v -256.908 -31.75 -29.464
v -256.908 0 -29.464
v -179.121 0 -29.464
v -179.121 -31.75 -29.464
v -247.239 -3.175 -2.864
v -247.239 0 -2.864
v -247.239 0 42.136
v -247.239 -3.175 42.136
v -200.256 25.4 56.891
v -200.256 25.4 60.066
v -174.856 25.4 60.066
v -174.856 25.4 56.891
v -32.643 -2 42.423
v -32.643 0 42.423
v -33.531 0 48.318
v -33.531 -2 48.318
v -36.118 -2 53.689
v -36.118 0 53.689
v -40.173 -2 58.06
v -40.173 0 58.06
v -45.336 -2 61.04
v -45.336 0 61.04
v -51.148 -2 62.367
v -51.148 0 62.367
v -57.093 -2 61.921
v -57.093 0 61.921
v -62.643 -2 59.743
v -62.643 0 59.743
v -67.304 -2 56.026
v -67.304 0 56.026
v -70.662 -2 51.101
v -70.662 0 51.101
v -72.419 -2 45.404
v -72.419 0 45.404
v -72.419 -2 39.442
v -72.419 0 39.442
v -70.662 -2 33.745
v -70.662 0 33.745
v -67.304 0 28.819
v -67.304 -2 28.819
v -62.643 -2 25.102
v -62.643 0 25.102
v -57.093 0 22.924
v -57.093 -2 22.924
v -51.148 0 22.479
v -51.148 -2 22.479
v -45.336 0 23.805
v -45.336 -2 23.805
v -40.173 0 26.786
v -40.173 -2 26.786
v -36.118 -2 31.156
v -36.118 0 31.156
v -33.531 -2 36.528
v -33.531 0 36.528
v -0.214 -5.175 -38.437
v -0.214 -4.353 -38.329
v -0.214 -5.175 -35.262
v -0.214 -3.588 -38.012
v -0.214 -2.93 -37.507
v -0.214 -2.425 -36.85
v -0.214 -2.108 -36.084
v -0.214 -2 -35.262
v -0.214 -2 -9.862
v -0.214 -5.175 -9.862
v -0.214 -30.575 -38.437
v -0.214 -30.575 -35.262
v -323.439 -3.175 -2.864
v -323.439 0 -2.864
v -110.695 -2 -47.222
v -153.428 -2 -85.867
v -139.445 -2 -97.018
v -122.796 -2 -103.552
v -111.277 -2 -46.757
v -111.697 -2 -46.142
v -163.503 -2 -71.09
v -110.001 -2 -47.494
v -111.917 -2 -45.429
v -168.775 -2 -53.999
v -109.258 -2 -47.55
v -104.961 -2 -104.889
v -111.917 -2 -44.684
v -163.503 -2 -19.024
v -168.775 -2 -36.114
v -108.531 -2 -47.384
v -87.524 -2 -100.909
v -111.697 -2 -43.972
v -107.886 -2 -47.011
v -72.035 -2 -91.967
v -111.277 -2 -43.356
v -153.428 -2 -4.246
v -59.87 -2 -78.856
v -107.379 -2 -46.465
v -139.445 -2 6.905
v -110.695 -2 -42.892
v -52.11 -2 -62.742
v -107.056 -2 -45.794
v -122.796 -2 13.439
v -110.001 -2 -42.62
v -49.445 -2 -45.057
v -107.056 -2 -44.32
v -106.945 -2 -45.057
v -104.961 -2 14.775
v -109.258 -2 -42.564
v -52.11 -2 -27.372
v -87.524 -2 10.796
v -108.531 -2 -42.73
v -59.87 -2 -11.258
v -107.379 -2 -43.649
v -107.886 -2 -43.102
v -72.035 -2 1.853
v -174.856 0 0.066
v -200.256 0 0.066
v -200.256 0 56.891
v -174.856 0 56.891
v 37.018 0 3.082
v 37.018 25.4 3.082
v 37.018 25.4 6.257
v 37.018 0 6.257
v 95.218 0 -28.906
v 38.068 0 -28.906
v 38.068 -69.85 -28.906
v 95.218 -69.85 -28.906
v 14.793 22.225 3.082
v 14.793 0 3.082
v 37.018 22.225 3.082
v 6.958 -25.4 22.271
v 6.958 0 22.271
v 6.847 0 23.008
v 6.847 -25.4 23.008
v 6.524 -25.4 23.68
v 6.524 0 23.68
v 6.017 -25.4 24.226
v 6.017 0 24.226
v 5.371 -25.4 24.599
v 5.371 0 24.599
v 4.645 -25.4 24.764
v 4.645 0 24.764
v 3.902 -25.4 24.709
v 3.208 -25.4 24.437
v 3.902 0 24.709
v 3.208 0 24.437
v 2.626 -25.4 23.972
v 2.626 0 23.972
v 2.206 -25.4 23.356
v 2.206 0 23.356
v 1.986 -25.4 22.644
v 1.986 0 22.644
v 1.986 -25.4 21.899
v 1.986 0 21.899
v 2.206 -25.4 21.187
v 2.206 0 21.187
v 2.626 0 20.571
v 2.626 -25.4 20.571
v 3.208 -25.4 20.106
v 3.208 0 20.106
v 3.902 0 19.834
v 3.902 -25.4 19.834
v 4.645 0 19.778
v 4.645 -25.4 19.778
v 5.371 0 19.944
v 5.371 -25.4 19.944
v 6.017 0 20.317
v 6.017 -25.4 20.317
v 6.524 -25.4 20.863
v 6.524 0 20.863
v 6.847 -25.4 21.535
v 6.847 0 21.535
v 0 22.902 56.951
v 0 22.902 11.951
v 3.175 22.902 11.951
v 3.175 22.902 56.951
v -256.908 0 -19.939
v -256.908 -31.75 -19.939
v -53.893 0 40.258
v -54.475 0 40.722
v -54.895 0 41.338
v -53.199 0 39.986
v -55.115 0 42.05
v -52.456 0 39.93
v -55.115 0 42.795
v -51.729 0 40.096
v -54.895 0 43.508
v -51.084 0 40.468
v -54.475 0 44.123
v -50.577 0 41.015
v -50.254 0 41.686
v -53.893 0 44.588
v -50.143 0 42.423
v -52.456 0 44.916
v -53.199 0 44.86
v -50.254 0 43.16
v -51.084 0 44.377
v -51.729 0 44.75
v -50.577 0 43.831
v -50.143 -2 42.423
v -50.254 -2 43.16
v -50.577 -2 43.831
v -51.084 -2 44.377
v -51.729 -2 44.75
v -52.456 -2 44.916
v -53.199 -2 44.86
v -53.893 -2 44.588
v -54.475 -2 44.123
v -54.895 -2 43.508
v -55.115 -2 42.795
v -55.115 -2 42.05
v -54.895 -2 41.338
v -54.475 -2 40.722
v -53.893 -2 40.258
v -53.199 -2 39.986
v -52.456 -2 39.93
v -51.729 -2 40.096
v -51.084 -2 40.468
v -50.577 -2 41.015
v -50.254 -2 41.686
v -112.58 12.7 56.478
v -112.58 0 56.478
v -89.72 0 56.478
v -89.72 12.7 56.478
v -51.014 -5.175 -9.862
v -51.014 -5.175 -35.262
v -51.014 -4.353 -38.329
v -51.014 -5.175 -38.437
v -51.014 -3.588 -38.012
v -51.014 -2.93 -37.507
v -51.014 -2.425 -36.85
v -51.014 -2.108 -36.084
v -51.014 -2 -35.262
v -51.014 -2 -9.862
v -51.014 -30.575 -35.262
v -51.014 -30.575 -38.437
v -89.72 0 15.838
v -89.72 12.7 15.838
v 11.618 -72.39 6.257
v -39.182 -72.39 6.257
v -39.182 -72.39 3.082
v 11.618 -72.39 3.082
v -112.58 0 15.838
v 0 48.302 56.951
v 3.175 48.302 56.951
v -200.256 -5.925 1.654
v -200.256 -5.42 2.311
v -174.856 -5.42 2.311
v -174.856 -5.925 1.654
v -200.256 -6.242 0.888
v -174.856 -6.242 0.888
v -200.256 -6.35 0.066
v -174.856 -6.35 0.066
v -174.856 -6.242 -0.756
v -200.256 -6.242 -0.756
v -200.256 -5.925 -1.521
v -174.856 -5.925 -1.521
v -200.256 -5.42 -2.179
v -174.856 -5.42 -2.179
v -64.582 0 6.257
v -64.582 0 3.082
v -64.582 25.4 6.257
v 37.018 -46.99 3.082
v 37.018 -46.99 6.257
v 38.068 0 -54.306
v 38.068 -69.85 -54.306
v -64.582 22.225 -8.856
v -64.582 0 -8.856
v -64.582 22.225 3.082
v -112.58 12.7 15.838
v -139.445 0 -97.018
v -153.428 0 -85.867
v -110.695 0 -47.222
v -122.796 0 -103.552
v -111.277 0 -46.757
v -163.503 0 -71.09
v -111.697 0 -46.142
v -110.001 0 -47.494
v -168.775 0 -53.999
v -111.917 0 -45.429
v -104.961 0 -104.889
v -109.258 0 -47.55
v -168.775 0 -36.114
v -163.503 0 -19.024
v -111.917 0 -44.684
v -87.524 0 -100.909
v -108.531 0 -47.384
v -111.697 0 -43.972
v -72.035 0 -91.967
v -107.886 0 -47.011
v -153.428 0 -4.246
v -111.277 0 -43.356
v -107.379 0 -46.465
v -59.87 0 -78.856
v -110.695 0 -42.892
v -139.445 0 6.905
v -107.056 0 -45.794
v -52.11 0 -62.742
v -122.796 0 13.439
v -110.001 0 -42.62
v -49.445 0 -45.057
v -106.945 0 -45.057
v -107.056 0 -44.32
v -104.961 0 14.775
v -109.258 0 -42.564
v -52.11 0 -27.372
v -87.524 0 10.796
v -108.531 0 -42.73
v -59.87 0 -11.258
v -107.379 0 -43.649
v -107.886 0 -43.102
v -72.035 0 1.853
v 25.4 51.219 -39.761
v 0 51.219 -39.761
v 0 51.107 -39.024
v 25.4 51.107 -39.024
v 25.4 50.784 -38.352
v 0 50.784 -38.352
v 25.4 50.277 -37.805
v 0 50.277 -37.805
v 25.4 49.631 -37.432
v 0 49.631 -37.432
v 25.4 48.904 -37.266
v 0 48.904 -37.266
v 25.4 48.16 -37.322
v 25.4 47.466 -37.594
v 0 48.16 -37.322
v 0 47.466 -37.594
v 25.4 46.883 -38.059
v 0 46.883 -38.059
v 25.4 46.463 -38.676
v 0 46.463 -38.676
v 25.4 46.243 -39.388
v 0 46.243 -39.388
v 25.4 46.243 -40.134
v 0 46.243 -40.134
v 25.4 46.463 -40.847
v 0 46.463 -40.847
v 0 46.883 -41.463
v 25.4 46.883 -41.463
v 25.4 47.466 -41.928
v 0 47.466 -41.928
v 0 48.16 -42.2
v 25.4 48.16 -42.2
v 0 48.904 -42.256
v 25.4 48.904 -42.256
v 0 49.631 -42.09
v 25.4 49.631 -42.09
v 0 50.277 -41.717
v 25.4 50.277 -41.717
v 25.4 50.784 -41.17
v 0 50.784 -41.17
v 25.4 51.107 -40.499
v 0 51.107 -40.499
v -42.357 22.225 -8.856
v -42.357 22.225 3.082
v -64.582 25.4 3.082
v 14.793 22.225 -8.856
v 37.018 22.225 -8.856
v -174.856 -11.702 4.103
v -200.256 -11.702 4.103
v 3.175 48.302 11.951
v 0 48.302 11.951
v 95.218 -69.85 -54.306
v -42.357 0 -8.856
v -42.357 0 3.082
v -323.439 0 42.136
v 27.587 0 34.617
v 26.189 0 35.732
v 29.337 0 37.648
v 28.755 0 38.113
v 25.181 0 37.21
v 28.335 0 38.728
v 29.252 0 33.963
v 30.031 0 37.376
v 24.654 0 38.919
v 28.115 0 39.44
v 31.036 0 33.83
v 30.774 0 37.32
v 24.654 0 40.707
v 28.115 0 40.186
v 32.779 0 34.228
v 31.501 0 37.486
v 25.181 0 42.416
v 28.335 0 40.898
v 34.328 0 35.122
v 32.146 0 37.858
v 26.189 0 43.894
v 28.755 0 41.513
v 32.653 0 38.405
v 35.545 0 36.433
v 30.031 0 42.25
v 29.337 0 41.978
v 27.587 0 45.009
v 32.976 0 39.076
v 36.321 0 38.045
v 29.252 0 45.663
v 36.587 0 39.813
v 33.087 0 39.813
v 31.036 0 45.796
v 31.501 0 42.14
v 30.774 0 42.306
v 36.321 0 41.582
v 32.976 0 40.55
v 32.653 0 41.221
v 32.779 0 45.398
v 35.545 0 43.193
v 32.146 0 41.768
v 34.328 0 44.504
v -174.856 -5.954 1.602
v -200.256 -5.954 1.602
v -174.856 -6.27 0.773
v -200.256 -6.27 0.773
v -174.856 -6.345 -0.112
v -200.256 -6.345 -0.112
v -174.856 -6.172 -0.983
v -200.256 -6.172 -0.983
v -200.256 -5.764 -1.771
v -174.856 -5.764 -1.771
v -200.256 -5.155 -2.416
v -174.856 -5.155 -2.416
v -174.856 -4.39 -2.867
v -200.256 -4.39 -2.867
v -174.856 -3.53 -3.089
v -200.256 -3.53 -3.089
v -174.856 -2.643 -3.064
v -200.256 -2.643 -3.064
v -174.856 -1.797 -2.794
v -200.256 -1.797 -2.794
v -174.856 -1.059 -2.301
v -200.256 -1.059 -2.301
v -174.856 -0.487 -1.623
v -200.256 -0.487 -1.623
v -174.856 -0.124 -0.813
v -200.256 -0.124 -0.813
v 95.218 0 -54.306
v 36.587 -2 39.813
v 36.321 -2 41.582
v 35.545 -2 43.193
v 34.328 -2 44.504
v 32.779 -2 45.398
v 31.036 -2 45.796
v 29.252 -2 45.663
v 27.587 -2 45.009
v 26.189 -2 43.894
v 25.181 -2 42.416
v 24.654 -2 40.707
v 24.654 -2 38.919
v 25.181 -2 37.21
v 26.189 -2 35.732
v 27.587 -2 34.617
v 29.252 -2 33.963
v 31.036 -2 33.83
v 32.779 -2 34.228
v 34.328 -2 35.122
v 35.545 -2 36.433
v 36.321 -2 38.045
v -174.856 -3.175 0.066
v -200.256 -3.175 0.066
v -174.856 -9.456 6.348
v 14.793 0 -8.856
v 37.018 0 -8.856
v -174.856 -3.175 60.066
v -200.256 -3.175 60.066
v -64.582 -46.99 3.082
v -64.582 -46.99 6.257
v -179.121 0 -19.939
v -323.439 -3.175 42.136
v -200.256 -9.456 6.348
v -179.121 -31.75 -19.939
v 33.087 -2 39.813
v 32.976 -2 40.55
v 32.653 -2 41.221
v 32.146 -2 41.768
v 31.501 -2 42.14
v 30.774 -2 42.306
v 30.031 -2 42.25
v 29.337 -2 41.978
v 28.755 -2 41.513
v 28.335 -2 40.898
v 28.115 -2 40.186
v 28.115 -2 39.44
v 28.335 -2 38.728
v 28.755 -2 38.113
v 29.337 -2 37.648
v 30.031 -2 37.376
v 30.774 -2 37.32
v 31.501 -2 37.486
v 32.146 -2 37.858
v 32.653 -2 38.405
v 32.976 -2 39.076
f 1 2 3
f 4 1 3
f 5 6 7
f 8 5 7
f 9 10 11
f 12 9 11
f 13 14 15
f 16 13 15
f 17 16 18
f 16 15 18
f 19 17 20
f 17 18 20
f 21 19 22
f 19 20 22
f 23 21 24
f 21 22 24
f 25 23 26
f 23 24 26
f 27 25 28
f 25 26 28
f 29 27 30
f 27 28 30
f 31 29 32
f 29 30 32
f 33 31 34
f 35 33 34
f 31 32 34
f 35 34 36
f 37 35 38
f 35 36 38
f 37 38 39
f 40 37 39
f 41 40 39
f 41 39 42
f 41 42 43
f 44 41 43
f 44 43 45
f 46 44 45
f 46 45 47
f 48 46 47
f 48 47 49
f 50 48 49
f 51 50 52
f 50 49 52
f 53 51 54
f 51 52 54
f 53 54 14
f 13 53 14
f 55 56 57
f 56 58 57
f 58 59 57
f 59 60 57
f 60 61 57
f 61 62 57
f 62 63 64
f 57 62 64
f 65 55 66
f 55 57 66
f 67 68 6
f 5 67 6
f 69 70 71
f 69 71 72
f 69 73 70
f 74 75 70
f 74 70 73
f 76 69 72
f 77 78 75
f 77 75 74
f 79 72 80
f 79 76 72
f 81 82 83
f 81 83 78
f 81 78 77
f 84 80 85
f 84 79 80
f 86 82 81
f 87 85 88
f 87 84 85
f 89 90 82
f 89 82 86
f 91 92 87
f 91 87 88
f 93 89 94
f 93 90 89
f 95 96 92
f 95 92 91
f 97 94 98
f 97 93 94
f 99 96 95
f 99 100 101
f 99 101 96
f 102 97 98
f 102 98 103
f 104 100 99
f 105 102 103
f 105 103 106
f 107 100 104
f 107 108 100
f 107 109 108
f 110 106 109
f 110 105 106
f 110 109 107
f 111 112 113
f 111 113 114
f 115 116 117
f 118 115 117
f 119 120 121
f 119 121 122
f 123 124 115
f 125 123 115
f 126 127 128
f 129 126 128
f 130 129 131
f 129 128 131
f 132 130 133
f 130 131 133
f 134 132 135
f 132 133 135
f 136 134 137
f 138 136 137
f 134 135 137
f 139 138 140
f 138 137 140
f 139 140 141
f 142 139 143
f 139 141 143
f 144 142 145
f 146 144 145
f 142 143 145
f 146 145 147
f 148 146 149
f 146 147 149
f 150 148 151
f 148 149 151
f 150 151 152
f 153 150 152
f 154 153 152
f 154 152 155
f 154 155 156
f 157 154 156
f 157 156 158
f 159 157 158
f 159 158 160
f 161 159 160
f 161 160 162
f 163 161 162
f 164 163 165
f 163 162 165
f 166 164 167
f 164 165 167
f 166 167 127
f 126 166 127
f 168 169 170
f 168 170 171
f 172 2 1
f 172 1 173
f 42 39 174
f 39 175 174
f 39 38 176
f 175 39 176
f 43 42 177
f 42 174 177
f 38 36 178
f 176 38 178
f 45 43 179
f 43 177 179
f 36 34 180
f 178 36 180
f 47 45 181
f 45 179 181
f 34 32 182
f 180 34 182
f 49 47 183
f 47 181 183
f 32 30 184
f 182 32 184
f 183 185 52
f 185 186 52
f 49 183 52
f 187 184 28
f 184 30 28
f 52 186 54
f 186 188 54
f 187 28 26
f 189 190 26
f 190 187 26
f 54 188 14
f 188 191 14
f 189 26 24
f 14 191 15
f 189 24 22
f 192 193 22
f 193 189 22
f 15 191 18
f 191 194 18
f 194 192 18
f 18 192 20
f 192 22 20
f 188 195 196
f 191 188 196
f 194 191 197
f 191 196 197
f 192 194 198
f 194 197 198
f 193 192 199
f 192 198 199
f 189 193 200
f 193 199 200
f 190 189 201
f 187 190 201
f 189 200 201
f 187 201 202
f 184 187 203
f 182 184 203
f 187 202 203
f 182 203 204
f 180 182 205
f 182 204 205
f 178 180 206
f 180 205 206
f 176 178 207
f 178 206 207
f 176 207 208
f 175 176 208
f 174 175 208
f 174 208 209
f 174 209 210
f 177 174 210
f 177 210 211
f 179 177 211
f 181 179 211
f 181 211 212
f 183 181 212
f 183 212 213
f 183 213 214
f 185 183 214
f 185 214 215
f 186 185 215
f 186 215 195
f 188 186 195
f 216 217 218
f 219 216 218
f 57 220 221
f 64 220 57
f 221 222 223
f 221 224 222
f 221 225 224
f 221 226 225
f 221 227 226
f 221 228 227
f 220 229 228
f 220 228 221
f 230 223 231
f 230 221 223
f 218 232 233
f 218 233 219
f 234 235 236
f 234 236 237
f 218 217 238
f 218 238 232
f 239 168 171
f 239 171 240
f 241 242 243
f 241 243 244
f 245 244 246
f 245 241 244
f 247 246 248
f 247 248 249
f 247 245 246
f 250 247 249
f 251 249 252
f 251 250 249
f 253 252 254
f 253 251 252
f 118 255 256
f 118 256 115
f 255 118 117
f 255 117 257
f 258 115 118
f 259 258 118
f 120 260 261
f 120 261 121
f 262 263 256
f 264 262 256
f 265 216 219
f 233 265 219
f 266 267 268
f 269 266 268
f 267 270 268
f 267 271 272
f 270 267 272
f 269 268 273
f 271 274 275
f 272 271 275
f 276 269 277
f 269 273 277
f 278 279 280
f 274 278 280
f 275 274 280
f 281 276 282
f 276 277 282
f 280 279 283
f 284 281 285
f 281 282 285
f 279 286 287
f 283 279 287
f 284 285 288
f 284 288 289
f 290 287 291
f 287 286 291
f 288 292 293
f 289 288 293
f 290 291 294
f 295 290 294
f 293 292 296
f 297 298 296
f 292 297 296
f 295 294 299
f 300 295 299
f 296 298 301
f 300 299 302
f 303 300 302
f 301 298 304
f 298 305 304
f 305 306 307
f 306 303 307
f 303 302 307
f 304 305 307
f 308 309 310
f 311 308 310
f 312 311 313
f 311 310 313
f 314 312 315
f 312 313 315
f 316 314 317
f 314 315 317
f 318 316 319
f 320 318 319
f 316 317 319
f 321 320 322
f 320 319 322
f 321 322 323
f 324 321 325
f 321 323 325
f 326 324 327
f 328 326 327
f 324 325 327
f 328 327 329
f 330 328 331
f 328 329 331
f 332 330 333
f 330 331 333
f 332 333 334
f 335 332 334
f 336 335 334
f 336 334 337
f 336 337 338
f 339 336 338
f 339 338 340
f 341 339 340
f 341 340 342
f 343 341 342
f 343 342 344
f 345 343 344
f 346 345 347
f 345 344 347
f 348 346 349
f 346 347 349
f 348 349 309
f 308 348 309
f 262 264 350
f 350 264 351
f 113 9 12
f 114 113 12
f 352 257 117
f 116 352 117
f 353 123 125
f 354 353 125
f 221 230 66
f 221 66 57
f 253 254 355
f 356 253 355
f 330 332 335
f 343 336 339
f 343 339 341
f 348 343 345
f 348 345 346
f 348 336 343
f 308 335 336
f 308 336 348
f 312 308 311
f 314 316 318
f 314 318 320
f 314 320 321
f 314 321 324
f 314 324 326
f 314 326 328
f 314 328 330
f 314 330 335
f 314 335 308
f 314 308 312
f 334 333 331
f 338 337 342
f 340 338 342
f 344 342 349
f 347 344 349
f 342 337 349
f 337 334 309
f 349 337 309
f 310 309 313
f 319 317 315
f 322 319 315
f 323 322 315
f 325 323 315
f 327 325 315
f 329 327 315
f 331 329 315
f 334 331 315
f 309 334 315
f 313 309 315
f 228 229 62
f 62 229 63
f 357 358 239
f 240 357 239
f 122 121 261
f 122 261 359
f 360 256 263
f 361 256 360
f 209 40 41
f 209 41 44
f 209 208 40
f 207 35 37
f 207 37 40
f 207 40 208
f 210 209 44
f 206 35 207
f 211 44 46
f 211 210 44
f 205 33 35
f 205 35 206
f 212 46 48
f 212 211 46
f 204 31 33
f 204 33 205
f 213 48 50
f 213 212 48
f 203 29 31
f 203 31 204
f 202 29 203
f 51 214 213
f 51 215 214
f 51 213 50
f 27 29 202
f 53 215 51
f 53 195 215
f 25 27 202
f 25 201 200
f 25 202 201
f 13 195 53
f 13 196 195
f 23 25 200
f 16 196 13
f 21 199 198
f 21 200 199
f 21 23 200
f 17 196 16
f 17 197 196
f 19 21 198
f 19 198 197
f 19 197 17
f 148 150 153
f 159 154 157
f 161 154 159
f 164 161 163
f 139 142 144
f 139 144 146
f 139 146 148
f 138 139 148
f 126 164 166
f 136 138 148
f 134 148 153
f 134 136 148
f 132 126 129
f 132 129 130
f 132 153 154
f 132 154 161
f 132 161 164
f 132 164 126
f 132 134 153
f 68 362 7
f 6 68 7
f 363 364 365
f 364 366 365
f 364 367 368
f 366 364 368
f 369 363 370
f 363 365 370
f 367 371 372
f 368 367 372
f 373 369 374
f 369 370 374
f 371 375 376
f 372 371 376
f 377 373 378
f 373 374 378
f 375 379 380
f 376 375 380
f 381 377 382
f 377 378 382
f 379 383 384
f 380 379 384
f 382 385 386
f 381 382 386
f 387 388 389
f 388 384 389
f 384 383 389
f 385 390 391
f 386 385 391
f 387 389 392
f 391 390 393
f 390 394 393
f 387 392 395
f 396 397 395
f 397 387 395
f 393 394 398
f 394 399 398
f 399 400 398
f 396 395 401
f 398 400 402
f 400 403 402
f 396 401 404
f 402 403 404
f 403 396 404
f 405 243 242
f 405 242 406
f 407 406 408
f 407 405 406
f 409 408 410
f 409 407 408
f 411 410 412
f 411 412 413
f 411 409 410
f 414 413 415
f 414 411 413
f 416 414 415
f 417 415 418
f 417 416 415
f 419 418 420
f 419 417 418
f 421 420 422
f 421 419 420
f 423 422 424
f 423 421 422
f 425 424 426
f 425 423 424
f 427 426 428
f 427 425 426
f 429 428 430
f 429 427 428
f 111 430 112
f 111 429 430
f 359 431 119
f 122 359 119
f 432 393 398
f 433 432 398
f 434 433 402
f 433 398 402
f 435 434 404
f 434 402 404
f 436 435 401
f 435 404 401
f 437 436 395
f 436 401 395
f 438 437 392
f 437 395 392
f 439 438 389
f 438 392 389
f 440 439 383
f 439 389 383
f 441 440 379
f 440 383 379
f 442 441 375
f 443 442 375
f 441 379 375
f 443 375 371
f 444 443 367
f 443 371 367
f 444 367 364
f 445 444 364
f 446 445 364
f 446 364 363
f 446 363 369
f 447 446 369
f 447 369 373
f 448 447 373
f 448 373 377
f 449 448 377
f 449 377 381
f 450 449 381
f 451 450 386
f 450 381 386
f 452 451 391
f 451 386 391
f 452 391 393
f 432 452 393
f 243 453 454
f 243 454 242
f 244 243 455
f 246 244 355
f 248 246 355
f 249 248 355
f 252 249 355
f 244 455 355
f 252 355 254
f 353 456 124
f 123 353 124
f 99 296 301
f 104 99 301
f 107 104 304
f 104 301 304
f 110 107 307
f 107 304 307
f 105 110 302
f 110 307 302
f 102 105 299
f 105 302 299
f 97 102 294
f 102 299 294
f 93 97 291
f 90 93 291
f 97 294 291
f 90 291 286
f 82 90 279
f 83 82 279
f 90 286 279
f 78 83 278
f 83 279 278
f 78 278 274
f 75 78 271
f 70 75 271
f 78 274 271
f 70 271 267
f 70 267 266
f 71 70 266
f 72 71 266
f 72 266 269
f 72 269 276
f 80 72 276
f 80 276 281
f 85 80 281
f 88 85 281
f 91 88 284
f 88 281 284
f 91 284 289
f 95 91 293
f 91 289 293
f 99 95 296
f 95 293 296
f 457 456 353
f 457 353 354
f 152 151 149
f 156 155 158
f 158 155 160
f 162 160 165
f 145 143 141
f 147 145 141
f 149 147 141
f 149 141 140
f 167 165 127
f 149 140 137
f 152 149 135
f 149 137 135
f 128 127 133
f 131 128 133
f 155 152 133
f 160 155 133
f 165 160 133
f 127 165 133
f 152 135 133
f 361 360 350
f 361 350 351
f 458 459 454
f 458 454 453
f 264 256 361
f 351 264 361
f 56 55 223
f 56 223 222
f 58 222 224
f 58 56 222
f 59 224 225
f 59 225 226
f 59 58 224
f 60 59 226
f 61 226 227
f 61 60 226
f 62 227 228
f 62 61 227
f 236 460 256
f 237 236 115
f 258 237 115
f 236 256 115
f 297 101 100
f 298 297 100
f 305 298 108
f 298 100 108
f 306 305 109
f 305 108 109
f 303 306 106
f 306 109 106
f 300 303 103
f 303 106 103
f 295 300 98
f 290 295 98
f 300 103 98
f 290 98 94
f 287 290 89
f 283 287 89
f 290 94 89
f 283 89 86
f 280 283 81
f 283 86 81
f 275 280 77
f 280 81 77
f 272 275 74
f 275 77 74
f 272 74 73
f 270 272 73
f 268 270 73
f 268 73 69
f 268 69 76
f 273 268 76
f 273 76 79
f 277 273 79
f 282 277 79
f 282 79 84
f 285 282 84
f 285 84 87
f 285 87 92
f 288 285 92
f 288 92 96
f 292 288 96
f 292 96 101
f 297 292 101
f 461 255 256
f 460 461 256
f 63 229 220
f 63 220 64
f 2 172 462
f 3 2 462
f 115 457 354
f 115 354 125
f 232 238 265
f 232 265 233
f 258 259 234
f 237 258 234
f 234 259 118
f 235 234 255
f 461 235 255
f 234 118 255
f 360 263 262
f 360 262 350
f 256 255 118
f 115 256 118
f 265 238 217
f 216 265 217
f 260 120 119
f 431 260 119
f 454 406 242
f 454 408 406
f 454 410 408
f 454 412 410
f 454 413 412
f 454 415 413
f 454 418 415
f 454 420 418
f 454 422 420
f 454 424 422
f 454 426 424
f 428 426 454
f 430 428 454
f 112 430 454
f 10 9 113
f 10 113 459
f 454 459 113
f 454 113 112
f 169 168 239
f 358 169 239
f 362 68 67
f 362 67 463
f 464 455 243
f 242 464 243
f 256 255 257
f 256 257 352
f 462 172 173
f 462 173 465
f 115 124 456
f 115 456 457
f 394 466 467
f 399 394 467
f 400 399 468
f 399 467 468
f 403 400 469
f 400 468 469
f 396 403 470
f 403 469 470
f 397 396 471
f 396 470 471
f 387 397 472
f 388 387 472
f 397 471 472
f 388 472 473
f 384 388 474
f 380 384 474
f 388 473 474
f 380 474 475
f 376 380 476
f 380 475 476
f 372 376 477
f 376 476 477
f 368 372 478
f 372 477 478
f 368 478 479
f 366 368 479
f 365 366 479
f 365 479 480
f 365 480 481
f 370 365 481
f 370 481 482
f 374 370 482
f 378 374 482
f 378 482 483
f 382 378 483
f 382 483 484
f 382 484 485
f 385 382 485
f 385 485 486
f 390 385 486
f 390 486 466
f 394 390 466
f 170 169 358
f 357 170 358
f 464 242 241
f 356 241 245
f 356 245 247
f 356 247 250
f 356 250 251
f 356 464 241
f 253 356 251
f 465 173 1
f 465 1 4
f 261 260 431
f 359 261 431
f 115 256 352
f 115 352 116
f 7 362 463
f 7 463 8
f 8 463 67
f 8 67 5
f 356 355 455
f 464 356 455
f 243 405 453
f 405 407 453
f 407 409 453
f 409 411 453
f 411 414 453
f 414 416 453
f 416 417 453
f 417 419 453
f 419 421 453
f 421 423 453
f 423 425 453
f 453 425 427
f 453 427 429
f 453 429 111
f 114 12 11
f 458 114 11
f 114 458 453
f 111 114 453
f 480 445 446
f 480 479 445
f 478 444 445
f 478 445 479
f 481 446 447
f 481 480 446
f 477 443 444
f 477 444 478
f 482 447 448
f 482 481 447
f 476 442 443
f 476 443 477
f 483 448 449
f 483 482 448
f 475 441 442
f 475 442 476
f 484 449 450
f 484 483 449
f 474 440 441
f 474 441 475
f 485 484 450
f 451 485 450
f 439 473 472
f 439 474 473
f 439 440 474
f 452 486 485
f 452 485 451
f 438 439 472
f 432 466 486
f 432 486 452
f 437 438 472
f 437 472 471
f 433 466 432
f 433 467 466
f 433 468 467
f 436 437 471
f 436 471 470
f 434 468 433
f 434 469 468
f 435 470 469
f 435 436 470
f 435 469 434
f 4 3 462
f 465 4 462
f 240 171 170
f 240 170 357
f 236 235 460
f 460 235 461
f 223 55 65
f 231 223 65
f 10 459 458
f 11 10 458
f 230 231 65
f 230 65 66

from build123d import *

# Parameters (mm, degrees)
F0_W      = 22.225
F0_H      = 11.938
F1_DEPTH  = 22.225
F2_DEPTH  = 22.225
F3_W      = 22.86
F3_H      = 40.64
F4_DEPTH  = 12.7
F5_W      = 57.15
F5_H      = 25.4
F6_DEPTH  = 69.85
F7_DEPTH  = 25.4
F8_DEPTH  = 72.39
F9_R      = 20
F10_DEPTH = 2
F11_R     = 6
F12_DEPTH = 2
F14_DEPTH = 25.4
F15_W     = 50.8
F15_H     = 25.4
F16_DEPTH = 3.175
F17_W     = 50.8
F17_H     = 3.175
F20_DEPTH = 50.8
F22_DEPTH = 50.8
F23_R     = 60
F24_DEPTH = 2
F25_R     = 2.5
F26_DEPTH = 25.4
F27_R     = 2.5
F28_DEPTH = 25.4
F29_R     = 2.5
F30_DEPTH = 25.4
F31_R     = 2.5
F32_DEPTH = 25.4
F33_W     = 77.7875
F33_H     = 9.525
F34_DEPTH = 31.75
F35_W     = 25.4
F35_H     = 60
F36_DEPTH = 3.175
F37_W     = 25.4
F37_H     = 3.175
F40_DEPTH = 25.4
F41_DEPTH = 25.4
F42_W     = 25.4
F42_H     = 3.175
F43_DEPTH = 28.575
F44_W     = 76.2
F44_H     = 45
F45_DEPTH = 3.175
F46_W     = 25.4
F46_H     = 45
F47_DEPTH = 3.175
F48_R     = 2.5019
F49_DEPTH = 25.4


with BuildPart() as f1:
    # F0 (on Front) → F1 (new body)
    with BuildSketch(Plane.XZ):
        with Locations((-53.469562, -2.8866)):
            Rectangle(F0_W, F0_H)
    extrude(amount=-F1_DEPTH)


with BuildPart() as f2:
    # F0 (on Front) → F2 (new body)
    with BuildSketch(Plane.XZ):
        with Locations((25.905438, -2.8866)):
            Rectangle(F0_W, F0_H)
    extrude(amount=-F2_DEPTH)


with BuildPart() as f4:
    # F3 (on Front) → F4 (new body)
    with BuildSketch(Plane.XZ):
        with Locations((-101.150385, 36.158367)):
            Rectangle(F3_W, F3_H)
    extrude(amount=-F4_DEPTH)


with BuildPart() as f6:
    # F5 (on Front) → F6 (new body)
    with BuildSketch(Plane.XZ):
        with Locations((66.642915, -41.606452)):
            Rectangle(F5_W, F5_H)
    extrude(amount=F6_DEPTH)


with BuildPart() as f7:
    # F0 (on Front) → F7 (new body)
    with BuildSketch(Plane.XZ):
        Polygon((-64.582062, 6.2574), (-64.582062, 3.0824), (-42.357062, 3.0824), (14.792938, 3.0824), (37.017938, 3.0824), (37.017938, 6.2574), align=None)
    extrude(amount=-F7_DEPTH)


with BuildPart() as f8:
    # F0 (on Front) → F8 (new body)
    with BuildSketch(Plane.XZ):
        Polygon((-64.582062, 6.2574), (-64.582062, 3.0824), (-42.357062, 3.0824), (14.792938, 3.0824), (37.017938, 3.0824), (37.017938, 6.2574), align=None)
    extrude(amount=F8_DEPTH)

    # F13 (on face) → F14 (cut)
    with BuildSketch(Plane.XY.offset(6.2574)):
        Polygon((-64.582062, -72.39), (-39.182062, -72.39), (-64.582062, -46.99), align=None)
        Polygon((37.017938, -72.39), (37.017938, -46.99), (11.617938, -72.39), align=None)
    extrude(amount=-F14_DEPTH, mode=Mode.SUBTRACT)


with BuildPart() as f10:
    # F9 (on Front) → F10 (new body)
    with BuildSketch(Plane.XZ):
        with Locations((-52.642774, 42.422887)):
            Circle(F9_R)
    extrude(amount=F10_DEPTH)

    # F27 (on face) → F28 (cut)
    with BuildSketch(Plane.XZ.offset(2)):
        with Locations((-52.642774, 42.422887)):
            Circle(F27_R)
    extrude(amount=-F28_DEPTH, mode=Mode.SUBTRACT)


with BuildPart() as f12:
    # F11 (on Front) → F12 (new body)
    with BuildSketch(Plane.XZ):
        with Locations((30.587189, 39.813034)):
            Circle(F11_R)
    extrude(amount=F12_DEPTH)

    # F29 (on face) → F30 (cut)
    with BuildSketch(Plane.XZ.offset(2)):
        with Locations((30.587189, 39.813034)):
            Circle(F29_R)
    extrude(amount=-F30_DEPTH, mode=Mode.SUBTRACT)


with BuildPart() as f16:
    # F15 (on face) → F16 (new body)
    with BuildSketch(Plane.XZ.offset(2)):
        with Locations((-25.614209, -22.562116)):
            Rectangle(F15_W, F15_H)
    extrude(amount=F16_DEPTH)

    # F17 (on face) → F18 (revolve)
    with BuildSketch(Plane.XZ.offset(5.175)):
        with Locations((-25.614209, -33.674616)):
            Rectangle(F17_W, F17_H)
    revolve(axis=Axis((-25.614209, -5.175, -35.262116), (1, 0, 0)))

    # F19 (on face) → F20 (cut)
    with BuildSketch(Plane(origin=(-51.014209, 0, 0), x_dir=(0, -1, 0), z_dir=(-1, 0, 0))):
        with BuildLine():
            ThreePointArc((8.35, -35.262116), (7.420064, -33.017052), (5.175, -32.087116))
            Line((5.175, -32.087116), (5.175, -35.262116))
            Line((5.175, -35.262116), (8.35, -35.262116))
        make_face()
    extrude(amount=-F20_DEPTH, mode=Mode.SUBTRACT)

    # F21 (on face) → F22 (join)
    with BuildSketch(Plane(origin=(-51.014209, 0, 0), x_dir=(0, -1, 0), z_dir=(-1, 0, 0))):
        with BuildLine():
            ThreePointArc((8.35, -35.262116), (7.420064, -37.507181), (5.175, -38.437116))
            Line((5.175, -38.437116), (30.575, -38.437116))
            Line((30.575, -38.437116), (30.575, -35.262116))
            Line((30.575, -35.262116), (8.35, -35.262116))
        make_face()
    extrude(amount=-F22_DEPTH)


with BuildPart() as f24:
    # F23 (on Front) → F24 (new body)
    with BuildSketch(Plane.XZ):
        with Locations((-109.444685, -45.056824)):
            Circle(F23_R)
    extrude(amount=F24_DEPTH)

    # F25 (on face) → F26 (cut)
    with BuildSketch(Plane.XZ.offset(2)):
        with Locations((-109.444685, -45.056824)):
            Circle(F25_R)
    extrude(amount=-F26_DEPTH, mode=Mode.SUBTRACT)


with BuildPart() as f32:
    # F31 (on Front) → F32 (new body)
    with BuildSketch(Plane.XZ):
        with Locations((4.458145, 22.271456)):
            Circle(F31_R)
    extrude(amount=F32_DEPTH)


with BuildPart() as f34:
    # F33 (on Front) → F34 (new body)
    with BuildSketch(Plane.XZ):
        with Locations((-218.014501, -24.70176)):
            Rectangle(F33_W, F33_H)
    extrude(amount=F34_DEPTH)


with BuildPart() as f36:
    # F35 (on Front) → F36 (new body)
    with BuildSketch(Plane.XZ):
        with Locations((-187.555594, 30.06612)):
            Rectangle(F35_W, F35_H)
    extrude(amount=F36_DEPTH)

    # F37 (on face) → F38 (revolve)
    with BuildSketch(Plane.XZ.offset(3.175)):
        with Locations((-187.555594, 1.65362)):
            Rectangle(F37_W, F37_H)
    revolve(axis=Axis((-187.555594, -3.175, 0.06612), (1, 0, 0)))

    # F39 (on face) → F41 (cut)
    with BuildSketch(Plane(origin=(-200.255594, 0, 0), x_dir=(0, -1, 0), z_dir=(-1, 0, 0))):
        with BuildLine():
            ThreePointArc((5.420064, 2.311184), (4.39002, 2.999437), (3.175, 3.24112))
            Line((3.175, 3.24112), (3.175, 0.06612))
            Line((3.175, 0.06612), (5.420064, 2.311184))
        make_face()
    extrude(amount=-F41_DEPTH, mode=Mode.SUBTRACT)

    # F42 (on face) → F43 (join)
    with BuildSketch(Plane.XZ.offset(3.175)):
        with Locations((-187.555594, 58.47862)):
            Rectangle(F42_W, F42_H)
    extrude(amount=-F43_DEPTH)


with BuildPart() as f40:
    # F39 (on face) → F40 (new body)
    with BuildSketch(Plane(origin=(-200.255594, 0, 0), x_dir=(0, -1, 0), z_dir=(-1, 0, 0))):
        with BuildLine():
            Line((9.456451, 6.347571), (5.420064, 2.311184))
            ThreePointArc((5.420064, 2.311184), (6.35, 0.06612), (5.420064, -2.178944))
            Line((5.420064, -2.178944), (11.701515, 4.102507))
            Line((11.701515, 4.102507), (9.456451, 6.347571))
        make_face()
    extrude(amount=-F40_DEPTH)


with BuildPart() as f45:
    # F44 (on Front) → F45 (new body)
    with BuildSketch(Plane.XZ):
        with Locations((-285.338883, 19.636434)):
            Rectangle(F44_W, F44_H)
    extrude(amount=F45_DEPTH)


with BuildPart() as f47:
    # F46 (on Right) → F47 (new body)
    with BuildSketch(Plane.YZ):
        with Locations((35.602256, 34.450616)):
            Rectangle(F46_W, F46_H)
    extrude(amount=F47_DEPTH)


with BuildPart() as f49:
    # F48 (on Right) → F49 (new body)
    with BuildSketch(Plane.YZ):
        with Locations((48.716638, -39.761063)):
            Circle(F48_R)
    extrude(amount=F49_DEPTH)


solid = Compound([f1.part, f2.part, f4.part, f6.part, f7.part, f8.part, f10.part, f12.part, f16.part, f24.part, f32.part, f34.part, f36.part, f40.part, f45.part, f47.part, f49.part])
